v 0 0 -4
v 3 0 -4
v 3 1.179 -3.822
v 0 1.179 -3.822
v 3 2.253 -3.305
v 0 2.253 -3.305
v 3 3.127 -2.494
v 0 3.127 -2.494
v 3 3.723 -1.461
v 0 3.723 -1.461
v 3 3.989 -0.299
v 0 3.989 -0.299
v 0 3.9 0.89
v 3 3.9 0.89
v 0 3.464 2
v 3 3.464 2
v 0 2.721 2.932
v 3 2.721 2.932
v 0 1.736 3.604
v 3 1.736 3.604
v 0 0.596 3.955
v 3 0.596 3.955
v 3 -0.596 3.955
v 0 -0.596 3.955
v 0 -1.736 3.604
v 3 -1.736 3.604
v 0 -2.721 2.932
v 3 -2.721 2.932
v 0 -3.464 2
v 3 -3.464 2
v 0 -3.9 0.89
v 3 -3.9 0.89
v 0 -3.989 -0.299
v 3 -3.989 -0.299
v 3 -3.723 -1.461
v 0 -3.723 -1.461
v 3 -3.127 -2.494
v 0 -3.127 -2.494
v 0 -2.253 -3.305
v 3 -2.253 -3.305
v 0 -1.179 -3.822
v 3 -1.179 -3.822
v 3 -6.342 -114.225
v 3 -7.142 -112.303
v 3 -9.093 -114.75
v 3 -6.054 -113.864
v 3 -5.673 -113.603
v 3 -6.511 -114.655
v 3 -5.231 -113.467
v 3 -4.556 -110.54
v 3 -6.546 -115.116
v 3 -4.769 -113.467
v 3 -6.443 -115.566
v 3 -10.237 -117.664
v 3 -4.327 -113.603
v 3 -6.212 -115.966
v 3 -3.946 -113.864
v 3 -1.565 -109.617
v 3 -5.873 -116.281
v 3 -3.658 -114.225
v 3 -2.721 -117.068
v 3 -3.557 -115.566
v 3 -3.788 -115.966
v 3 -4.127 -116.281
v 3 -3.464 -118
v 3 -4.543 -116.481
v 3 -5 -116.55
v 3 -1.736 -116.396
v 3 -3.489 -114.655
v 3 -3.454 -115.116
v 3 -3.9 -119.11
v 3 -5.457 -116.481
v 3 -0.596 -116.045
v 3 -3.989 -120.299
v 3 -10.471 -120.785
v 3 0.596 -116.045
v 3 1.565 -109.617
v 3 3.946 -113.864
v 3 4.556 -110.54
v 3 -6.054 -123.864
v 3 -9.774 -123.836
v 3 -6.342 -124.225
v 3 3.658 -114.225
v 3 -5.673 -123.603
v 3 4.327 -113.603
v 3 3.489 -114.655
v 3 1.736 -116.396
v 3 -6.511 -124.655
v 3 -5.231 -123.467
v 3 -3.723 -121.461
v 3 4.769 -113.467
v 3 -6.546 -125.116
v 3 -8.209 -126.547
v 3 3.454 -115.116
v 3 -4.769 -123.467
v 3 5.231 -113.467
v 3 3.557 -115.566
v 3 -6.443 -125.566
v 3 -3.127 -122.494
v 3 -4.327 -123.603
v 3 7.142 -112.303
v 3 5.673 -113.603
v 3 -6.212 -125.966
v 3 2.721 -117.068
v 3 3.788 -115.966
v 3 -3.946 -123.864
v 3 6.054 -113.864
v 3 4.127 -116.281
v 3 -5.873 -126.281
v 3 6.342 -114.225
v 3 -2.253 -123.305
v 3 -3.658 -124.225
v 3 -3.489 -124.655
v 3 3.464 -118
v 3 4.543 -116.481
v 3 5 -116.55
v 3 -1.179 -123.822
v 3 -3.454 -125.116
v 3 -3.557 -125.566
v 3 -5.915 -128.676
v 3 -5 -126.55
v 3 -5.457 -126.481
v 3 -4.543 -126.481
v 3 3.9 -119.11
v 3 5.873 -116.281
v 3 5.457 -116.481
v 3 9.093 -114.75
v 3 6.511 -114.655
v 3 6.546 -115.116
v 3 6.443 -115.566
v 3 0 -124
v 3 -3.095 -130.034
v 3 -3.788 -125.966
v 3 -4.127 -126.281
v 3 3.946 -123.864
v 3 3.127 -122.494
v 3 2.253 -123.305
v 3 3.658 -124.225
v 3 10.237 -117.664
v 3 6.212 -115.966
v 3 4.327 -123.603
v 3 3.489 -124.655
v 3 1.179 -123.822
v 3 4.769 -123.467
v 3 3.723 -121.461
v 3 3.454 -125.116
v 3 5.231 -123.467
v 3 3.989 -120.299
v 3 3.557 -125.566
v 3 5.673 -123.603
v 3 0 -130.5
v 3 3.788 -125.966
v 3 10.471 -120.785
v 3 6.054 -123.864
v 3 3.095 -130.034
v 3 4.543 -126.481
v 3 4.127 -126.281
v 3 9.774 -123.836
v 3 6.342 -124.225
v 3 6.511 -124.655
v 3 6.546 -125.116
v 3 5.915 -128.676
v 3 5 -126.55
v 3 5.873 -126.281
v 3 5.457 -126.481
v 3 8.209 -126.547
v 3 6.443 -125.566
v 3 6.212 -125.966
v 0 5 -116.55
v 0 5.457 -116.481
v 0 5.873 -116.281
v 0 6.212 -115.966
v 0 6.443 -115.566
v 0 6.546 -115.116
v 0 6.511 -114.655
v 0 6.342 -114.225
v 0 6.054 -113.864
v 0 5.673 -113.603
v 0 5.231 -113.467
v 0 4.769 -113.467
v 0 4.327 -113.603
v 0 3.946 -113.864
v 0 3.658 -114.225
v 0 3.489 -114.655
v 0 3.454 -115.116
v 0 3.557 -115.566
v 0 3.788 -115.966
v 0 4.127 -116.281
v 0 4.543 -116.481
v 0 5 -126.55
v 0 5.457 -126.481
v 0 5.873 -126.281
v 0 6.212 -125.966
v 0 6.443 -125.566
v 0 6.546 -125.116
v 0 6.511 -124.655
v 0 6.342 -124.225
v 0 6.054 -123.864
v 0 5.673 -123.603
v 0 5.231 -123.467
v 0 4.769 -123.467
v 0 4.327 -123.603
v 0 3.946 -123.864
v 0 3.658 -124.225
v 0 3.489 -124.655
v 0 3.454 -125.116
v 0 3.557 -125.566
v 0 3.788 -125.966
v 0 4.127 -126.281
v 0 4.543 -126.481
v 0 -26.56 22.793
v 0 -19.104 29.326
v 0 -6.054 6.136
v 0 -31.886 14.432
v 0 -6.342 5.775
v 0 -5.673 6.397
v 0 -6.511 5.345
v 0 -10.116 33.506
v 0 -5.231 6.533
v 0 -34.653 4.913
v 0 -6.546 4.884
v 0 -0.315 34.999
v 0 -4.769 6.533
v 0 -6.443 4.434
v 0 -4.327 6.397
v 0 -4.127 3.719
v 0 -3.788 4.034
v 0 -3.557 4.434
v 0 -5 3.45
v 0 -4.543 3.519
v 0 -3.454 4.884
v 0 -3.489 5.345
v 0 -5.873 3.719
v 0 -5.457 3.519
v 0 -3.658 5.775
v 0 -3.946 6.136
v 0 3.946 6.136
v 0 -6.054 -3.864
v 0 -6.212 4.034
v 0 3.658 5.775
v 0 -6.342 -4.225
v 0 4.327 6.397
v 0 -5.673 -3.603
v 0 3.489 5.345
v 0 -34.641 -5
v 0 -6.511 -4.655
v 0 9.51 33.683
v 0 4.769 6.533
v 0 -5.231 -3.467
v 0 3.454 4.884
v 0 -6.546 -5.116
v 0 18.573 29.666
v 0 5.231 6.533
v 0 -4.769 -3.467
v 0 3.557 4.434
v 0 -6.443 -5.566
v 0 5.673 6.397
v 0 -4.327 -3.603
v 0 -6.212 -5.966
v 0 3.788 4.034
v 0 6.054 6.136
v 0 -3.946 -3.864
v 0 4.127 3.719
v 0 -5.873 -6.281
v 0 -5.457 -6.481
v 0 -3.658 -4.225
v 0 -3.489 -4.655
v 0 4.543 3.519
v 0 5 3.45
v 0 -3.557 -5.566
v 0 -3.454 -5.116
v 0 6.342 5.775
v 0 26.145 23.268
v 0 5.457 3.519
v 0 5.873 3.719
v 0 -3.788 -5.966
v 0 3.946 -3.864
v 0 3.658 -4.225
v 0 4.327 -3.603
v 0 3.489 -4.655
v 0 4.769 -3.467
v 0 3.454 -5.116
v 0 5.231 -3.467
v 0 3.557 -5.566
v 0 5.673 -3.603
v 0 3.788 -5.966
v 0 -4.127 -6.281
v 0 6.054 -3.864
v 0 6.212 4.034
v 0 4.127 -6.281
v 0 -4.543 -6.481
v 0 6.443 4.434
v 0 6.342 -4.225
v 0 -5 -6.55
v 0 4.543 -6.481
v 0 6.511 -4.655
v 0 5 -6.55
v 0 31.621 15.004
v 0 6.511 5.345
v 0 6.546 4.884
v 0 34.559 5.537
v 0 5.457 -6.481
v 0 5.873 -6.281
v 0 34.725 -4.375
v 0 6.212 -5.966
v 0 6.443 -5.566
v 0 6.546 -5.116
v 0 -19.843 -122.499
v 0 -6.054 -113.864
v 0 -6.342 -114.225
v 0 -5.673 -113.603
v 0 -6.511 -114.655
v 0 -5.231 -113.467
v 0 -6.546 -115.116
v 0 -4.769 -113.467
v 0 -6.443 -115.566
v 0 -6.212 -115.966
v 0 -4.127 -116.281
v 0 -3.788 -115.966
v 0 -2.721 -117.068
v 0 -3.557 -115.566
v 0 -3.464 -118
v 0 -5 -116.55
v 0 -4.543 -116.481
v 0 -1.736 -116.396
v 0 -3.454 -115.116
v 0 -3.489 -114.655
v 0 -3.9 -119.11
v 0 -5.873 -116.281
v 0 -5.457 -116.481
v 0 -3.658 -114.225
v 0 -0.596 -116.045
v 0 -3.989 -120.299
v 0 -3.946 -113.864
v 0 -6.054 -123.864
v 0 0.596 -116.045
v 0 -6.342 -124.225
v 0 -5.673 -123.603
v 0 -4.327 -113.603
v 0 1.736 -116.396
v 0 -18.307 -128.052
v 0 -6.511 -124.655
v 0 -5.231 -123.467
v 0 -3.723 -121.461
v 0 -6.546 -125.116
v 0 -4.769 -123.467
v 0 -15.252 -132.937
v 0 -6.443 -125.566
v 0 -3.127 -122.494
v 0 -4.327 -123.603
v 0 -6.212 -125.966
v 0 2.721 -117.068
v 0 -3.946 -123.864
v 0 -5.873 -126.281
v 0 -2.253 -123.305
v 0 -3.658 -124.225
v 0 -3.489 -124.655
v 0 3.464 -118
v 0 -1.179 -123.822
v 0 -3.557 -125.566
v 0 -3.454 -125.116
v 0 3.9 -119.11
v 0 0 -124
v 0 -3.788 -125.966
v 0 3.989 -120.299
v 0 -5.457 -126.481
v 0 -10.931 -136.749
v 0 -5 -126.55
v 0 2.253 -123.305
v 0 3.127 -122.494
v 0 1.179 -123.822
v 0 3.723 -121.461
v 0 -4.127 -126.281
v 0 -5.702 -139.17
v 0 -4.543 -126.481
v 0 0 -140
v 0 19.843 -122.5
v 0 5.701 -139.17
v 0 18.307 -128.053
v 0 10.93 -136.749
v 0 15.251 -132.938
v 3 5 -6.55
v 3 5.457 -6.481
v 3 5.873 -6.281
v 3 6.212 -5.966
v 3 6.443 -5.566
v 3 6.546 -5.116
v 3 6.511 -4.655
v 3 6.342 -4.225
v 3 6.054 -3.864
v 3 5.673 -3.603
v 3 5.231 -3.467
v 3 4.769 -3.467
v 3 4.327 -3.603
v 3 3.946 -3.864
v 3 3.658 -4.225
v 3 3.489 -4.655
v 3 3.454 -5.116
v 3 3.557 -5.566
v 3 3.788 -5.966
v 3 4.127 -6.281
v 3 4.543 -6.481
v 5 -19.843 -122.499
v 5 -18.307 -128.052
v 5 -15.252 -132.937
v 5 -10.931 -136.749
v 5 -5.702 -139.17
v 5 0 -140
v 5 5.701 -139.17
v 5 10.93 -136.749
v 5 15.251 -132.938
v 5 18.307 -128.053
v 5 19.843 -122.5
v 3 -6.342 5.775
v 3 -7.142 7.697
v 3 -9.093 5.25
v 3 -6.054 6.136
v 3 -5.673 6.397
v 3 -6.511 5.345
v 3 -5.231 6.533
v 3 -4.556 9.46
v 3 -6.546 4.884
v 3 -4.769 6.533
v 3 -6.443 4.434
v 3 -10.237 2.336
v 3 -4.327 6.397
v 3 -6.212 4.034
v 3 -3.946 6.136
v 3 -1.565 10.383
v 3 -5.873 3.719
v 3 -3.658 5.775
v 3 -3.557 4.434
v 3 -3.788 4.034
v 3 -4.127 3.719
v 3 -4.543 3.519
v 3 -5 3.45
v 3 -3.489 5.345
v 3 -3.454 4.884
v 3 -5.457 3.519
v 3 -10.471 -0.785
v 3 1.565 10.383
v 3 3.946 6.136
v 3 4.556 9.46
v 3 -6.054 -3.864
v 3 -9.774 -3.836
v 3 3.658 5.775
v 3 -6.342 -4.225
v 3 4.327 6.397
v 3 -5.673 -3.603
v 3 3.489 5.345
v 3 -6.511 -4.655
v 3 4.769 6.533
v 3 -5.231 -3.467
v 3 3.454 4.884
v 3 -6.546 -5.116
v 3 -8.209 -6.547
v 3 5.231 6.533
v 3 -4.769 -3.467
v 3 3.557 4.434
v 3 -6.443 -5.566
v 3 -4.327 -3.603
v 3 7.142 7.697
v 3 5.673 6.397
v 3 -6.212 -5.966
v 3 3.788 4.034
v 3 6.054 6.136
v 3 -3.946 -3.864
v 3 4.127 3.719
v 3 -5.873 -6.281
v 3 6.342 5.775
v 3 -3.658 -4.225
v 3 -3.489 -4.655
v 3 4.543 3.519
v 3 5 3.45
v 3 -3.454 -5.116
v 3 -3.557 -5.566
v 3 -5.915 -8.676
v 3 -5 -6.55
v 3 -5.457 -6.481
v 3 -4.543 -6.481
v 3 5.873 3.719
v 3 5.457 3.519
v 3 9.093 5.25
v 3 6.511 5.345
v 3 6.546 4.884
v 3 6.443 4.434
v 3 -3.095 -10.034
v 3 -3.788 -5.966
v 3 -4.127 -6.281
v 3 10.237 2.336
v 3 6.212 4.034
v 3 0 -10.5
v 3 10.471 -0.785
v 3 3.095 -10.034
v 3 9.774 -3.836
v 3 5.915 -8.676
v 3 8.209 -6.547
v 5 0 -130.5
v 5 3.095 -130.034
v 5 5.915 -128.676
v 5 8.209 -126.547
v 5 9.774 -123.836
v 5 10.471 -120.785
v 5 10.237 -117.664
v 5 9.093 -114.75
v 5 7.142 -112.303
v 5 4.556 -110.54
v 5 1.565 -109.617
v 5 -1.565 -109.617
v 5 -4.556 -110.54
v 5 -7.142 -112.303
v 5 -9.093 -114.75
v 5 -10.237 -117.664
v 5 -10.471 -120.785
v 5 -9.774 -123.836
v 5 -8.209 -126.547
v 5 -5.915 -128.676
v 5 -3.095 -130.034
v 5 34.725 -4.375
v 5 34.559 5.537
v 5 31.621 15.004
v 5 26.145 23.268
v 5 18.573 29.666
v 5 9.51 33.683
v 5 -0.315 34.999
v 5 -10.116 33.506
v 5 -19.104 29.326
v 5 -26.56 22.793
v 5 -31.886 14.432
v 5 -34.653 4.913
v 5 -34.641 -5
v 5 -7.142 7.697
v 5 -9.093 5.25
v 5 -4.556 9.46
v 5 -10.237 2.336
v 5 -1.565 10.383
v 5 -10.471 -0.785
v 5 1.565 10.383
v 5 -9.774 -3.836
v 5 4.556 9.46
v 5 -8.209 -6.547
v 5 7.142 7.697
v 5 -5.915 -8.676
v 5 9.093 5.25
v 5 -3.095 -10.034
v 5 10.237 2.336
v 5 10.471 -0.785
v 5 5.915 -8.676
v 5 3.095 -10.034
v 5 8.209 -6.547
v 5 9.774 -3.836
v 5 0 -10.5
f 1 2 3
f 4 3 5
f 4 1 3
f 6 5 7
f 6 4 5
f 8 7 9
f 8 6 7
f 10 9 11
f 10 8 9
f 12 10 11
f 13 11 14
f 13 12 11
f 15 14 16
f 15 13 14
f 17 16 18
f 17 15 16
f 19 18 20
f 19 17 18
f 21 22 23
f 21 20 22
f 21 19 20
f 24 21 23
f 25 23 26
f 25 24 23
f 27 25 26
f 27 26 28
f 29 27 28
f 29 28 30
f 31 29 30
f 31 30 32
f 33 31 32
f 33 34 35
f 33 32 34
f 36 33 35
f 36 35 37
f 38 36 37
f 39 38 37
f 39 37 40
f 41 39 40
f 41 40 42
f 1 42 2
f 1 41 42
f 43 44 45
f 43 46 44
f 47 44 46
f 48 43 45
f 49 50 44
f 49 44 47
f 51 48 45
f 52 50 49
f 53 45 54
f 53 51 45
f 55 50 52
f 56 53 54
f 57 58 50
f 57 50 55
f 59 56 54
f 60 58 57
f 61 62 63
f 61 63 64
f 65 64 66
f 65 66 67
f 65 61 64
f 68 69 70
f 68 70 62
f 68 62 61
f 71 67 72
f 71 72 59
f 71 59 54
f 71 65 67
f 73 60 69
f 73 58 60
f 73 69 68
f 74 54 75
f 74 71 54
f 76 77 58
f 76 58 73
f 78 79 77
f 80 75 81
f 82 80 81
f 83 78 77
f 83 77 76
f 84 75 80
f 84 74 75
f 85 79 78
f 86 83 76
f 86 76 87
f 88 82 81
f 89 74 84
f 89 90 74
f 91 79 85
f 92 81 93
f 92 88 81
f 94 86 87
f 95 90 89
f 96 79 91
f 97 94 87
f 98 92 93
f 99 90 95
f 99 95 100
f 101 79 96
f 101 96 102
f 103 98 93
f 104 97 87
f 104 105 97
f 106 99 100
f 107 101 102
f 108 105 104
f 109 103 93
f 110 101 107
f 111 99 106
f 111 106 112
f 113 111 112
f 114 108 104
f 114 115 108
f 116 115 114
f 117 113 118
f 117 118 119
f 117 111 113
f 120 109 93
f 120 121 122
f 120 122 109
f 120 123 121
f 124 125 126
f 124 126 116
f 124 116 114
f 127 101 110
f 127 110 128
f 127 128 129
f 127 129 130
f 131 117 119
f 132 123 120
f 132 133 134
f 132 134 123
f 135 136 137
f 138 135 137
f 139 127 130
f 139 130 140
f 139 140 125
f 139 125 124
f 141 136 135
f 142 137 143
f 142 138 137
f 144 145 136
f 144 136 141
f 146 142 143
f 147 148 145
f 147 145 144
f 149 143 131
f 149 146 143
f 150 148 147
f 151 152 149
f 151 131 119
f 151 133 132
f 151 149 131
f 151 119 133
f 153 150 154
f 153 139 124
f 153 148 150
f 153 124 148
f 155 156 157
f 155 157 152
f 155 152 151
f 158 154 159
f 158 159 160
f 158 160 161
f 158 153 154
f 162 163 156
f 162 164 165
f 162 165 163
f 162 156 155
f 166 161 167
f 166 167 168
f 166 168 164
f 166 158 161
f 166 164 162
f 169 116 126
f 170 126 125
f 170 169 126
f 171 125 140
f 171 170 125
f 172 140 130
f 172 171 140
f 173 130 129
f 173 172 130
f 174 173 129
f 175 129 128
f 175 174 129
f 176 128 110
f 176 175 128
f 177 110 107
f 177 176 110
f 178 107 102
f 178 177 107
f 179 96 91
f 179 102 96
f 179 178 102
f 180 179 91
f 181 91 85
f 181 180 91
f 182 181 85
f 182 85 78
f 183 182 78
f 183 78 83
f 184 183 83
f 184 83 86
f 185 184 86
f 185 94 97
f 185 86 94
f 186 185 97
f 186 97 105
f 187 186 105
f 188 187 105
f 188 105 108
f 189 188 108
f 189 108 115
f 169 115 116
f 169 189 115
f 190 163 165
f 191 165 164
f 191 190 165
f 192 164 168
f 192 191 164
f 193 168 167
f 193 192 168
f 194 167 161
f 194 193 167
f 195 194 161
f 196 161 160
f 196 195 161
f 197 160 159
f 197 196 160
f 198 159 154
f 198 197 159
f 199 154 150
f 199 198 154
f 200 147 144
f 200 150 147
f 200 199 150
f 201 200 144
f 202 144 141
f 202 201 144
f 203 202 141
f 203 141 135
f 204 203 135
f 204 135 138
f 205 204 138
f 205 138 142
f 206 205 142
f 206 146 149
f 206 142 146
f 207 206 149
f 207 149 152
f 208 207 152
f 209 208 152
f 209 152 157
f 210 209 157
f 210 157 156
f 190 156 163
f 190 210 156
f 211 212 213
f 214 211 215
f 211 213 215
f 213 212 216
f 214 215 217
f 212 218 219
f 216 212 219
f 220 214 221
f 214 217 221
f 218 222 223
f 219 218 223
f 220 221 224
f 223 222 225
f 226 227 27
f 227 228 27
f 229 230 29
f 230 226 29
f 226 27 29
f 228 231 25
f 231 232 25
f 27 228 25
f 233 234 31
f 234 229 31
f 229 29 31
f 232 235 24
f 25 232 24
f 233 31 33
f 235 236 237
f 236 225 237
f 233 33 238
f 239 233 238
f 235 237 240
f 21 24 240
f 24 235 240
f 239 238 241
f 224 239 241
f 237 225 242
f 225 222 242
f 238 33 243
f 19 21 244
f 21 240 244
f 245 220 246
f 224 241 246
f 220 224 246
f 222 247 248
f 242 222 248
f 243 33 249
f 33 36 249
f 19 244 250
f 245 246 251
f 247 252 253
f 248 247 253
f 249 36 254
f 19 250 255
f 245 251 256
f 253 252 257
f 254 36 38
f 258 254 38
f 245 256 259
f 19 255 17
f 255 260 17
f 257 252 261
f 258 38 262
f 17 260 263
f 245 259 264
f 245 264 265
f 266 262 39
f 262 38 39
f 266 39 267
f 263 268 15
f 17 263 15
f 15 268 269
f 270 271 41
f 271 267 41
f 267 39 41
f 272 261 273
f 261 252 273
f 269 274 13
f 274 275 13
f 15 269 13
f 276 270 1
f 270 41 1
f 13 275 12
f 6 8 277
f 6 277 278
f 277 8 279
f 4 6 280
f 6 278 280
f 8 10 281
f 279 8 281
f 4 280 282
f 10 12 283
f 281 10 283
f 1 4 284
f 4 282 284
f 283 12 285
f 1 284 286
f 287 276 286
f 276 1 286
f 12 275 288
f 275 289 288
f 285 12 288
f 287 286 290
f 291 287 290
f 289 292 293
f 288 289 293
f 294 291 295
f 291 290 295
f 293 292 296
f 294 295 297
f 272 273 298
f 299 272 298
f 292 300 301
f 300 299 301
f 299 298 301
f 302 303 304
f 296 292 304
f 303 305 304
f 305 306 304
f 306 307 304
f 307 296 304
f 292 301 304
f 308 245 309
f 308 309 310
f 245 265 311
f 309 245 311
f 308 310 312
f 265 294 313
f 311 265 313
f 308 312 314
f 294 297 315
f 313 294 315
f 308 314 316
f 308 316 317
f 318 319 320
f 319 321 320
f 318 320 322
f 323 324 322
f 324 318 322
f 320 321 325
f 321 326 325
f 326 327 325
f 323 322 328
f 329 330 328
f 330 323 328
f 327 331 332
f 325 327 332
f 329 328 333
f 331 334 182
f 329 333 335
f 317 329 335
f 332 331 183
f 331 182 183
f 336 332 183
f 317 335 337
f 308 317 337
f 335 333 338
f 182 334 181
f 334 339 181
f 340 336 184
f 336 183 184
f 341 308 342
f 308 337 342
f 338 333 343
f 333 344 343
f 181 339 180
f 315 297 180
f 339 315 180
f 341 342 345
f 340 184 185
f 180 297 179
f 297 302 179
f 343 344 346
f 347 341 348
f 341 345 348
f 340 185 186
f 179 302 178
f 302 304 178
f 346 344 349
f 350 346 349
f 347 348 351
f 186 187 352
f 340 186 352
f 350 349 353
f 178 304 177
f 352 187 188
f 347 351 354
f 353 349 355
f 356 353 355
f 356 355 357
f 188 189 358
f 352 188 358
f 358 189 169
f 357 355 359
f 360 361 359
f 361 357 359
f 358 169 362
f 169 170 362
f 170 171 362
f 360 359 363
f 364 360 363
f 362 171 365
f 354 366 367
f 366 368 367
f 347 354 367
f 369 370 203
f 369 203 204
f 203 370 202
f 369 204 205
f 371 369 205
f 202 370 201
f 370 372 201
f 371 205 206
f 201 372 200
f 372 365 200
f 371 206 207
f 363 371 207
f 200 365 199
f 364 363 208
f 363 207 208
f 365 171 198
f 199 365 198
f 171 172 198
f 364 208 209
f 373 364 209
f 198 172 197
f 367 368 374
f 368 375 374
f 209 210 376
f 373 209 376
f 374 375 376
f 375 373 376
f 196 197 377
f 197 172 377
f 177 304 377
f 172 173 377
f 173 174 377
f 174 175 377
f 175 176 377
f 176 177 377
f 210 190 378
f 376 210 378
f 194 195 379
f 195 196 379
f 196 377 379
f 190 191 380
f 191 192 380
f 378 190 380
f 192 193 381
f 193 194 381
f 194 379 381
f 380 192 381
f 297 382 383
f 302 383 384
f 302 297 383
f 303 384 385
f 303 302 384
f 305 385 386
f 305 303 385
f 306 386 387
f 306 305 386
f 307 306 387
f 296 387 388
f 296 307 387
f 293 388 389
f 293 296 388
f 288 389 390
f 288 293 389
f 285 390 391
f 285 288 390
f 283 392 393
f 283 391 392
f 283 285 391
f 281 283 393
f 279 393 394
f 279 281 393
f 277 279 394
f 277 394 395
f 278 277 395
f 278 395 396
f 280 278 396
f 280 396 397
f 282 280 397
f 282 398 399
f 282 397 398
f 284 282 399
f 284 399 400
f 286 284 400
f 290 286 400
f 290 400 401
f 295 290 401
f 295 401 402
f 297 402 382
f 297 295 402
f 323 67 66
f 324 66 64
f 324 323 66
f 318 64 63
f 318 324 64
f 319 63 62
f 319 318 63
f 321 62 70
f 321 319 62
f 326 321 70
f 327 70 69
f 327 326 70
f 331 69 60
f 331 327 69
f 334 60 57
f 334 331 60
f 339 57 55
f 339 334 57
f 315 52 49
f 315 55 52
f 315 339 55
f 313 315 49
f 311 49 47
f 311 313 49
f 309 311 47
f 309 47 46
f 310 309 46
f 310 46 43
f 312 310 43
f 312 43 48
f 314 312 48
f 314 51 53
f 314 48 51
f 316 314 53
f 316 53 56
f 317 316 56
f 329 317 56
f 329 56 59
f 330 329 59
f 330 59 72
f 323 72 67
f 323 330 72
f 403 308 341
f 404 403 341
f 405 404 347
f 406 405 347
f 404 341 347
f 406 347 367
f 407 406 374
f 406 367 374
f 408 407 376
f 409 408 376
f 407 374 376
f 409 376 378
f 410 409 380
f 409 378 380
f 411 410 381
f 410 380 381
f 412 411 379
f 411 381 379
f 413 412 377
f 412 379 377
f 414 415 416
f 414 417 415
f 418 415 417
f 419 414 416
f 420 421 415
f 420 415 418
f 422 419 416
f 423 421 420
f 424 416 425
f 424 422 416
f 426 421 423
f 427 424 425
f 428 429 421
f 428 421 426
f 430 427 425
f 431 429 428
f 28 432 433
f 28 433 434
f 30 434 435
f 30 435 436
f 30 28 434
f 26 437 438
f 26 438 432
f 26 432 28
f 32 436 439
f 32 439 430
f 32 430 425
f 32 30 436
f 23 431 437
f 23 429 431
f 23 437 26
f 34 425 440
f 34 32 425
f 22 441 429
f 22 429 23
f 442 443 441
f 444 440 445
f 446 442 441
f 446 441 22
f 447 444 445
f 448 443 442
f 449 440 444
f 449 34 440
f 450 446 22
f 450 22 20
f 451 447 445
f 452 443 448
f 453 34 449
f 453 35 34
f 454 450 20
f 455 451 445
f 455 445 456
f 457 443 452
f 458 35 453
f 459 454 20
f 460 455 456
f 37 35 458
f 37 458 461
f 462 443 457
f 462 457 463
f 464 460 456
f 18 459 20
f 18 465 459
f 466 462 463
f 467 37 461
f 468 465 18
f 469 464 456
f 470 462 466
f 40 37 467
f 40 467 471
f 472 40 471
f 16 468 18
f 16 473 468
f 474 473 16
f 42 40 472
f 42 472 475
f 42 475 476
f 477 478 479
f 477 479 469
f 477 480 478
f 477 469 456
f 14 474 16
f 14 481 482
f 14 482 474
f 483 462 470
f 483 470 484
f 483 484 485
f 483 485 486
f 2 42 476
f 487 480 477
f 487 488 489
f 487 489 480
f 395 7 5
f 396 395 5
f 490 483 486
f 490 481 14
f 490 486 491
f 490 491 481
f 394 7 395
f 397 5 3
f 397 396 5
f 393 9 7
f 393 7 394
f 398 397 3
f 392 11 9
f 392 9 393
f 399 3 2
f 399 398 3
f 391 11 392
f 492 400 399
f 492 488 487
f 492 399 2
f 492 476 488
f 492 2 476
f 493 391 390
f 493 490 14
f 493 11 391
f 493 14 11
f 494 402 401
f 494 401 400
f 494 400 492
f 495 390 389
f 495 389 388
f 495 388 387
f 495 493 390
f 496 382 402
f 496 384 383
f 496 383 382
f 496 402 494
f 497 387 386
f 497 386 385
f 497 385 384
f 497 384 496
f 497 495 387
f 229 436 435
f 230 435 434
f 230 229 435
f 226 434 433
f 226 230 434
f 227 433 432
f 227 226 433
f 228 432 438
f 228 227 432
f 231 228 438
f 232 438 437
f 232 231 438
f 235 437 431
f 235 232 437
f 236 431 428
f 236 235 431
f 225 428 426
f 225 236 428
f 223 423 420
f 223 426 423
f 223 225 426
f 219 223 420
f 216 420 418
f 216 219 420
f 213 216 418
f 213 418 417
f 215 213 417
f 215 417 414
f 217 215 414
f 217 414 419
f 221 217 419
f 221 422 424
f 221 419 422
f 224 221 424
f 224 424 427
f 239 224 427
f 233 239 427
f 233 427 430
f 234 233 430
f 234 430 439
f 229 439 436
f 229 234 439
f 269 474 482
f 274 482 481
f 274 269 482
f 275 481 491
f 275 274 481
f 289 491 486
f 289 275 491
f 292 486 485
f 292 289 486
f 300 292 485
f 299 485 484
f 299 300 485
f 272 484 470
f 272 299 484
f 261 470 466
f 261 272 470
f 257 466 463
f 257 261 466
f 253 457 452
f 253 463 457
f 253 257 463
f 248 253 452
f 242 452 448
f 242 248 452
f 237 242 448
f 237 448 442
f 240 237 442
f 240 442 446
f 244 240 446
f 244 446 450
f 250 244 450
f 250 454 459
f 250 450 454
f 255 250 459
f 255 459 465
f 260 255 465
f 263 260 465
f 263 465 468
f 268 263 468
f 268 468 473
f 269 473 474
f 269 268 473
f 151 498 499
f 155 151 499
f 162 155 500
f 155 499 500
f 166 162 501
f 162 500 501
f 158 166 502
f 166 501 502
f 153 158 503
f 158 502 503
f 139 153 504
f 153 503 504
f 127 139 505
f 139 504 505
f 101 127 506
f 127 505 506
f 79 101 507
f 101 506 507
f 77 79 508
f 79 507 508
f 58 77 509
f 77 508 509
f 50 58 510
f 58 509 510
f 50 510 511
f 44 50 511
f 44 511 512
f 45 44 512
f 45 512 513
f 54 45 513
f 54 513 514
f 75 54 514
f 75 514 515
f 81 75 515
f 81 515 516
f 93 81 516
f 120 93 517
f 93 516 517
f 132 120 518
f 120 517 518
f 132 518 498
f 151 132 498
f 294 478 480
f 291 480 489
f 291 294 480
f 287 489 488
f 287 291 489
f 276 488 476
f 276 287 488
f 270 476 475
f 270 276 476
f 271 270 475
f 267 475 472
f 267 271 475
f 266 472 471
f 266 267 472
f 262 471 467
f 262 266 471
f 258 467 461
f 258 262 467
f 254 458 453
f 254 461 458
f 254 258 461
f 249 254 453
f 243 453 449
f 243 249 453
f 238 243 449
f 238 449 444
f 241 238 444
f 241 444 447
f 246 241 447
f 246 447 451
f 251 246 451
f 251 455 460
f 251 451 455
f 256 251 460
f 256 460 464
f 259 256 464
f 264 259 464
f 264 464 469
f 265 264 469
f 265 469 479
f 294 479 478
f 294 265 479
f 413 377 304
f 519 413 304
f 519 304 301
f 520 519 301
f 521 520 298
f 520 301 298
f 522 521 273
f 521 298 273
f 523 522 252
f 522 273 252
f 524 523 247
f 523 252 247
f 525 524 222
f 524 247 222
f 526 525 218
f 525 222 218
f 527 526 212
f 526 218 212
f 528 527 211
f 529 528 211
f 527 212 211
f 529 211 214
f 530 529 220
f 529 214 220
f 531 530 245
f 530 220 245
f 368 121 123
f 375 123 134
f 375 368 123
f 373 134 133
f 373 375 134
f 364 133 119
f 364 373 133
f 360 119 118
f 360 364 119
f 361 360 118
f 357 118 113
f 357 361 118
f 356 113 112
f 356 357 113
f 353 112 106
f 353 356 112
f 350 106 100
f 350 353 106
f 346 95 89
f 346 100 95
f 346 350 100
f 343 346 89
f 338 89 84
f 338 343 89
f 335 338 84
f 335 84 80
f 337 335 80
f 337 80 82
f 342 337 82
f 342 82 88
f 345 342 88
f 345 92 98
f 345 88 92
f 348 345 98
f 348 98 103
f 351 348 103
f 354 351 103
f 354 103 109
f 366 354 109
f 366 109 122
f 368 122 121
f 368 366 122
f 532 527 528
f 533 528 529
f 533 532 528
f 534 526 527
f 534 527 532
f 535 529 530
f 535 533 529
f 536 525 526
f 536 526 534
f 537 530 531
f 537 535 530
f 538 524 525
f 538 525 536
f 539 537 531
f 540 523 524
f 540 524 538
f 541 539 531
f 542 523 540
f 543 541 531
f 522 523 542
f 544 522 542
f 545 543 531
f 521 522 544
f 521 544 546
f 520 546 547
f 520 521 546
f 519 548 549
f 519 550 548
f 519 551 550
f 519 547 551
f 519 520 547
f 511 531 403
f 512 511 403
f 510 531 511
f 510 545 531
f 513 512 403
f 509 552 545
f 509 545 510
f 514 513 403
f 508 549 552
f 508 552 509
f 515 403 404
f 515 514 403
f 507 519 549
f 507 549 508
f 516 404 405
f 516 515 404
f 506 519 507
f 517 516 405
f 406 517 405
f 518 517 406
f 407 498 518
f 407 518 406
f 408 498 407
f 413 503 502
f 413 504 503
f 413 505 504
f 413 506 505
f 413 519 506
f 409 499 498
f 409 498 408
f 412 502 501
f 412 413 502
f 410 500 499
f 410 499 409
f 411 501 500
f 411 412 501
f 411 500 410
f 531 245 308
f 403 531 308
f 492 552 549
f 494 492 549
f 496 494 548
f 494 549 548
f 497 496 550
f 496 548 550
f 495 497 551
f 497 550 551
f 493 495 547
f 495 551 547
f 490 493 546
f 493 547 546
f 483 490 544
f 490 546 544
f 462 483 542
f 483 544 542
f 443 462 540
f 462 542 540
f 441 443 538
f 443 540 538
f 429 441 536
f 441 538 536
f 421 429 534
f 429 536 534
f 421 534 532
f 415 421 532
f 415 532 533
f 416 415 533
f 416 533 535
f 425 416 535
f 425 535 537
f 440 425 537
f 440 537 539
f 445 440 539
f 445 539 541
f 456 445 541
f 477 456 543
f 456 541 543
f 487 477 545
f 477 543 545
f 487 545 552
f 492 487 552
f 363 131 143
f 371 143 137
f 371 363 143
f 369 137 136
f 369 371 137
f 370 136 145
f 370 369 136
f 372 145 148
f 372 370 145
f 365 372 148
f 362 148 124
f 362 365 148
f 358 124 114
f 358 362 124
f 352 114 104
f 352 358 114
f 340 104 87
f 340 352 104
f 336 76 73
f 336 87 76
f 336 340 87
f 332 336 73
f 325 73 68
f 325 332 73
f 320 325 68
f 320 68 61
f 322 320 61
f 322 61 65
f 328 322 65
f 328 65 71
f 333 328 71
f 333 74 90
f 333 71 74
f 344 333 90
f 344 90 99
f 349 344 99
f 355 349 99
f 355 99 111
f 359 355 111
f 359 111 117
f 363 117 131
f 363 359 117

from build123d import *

# Parameters (mm, degrees)
SKETCH_1_R          = 1.55
SKETCH_1_R_2        = 4
EXTRUDE_3_DEPTH     = 5
SKETCH_3_R          = 10.5
CUT_EXTRUDE_2_DEPTH = 2


with BuildPart() as part:
    # 草图1 → 凸台-拉伸3 (new body)
    with BuildSketch(Plane(origin=(0, 0, 0), x_dir=(0, 0, -1), z_dir=(1, 0, 0))):
        with BuildLine():
            Line((122.5, 19.843134833), (4.375, 34.725485958))
            ThreePointArc((4.375, 34.725485958), (-34.998579399, -0.315341144), (5, -34.641016151))
            Line((5, -34.641016151), (122.499047902, -19.843254763))
            ThreePointArc((122.499047902, -19.843254763), (139.999999994, -0.000479811), (122.5, 19.843134833))
        make_face()
        with Locations((-5, -5)):
            Circle(SKETCH_1_R, mode=Mode.SUBTRACT)
        with Locations((5, -5)):
            Circle(SKETCH_1_R, mode=Mode.SUBTRACT)
        with Locations((-5, 5)):
            Circle(SKETCH_1_R, mode=Mode.SUBTRACT)
        Circle(SKETCH_1_R_2, mode=Mode.SUBTRACT)
        with Locations((5, 5)):
            Circle(SKETCH_1_R, mode=Mode.SUBTRACT)
        with Locations((115, -5)):
            Circle(SKETCH_1_R, mode=Mode.SUBTRACT)
        with Locations((125, -5)):
            Circle(SKETCH_1_R, mode=Mode.SUBTRACT)
        with Locations((125, 5)):
            Circle(SKETCH_1_R, mode=Mode.SUBTRACT)
        with Locations((115, 5)):
            Circle(SKETCH_1_R, mode=Mode.SUBTRACT)
        with Locations((120, 0)):
            Circle(SKETCH_1_R_2, mode=Mode.SUBTRACT)
    extrude(amount=EXTRUDE_3_DEPTH)

    # 草图3 → 切除-拉伸2 (cut)
    with BuildSketch(Plane(origin=(5, 0, 0), x_dir=(0, 0, -1), z_dir=(1, 0, 0))):
        Circle(SKETCH_3_R)
        with Locations((120, 0)):
            Circle(SKETCH_3_R)
    extrude(amount=-CUT_EXTRUDE_2_DEPTH, mode=Mode.SUBTRACT)


solid = part.part
